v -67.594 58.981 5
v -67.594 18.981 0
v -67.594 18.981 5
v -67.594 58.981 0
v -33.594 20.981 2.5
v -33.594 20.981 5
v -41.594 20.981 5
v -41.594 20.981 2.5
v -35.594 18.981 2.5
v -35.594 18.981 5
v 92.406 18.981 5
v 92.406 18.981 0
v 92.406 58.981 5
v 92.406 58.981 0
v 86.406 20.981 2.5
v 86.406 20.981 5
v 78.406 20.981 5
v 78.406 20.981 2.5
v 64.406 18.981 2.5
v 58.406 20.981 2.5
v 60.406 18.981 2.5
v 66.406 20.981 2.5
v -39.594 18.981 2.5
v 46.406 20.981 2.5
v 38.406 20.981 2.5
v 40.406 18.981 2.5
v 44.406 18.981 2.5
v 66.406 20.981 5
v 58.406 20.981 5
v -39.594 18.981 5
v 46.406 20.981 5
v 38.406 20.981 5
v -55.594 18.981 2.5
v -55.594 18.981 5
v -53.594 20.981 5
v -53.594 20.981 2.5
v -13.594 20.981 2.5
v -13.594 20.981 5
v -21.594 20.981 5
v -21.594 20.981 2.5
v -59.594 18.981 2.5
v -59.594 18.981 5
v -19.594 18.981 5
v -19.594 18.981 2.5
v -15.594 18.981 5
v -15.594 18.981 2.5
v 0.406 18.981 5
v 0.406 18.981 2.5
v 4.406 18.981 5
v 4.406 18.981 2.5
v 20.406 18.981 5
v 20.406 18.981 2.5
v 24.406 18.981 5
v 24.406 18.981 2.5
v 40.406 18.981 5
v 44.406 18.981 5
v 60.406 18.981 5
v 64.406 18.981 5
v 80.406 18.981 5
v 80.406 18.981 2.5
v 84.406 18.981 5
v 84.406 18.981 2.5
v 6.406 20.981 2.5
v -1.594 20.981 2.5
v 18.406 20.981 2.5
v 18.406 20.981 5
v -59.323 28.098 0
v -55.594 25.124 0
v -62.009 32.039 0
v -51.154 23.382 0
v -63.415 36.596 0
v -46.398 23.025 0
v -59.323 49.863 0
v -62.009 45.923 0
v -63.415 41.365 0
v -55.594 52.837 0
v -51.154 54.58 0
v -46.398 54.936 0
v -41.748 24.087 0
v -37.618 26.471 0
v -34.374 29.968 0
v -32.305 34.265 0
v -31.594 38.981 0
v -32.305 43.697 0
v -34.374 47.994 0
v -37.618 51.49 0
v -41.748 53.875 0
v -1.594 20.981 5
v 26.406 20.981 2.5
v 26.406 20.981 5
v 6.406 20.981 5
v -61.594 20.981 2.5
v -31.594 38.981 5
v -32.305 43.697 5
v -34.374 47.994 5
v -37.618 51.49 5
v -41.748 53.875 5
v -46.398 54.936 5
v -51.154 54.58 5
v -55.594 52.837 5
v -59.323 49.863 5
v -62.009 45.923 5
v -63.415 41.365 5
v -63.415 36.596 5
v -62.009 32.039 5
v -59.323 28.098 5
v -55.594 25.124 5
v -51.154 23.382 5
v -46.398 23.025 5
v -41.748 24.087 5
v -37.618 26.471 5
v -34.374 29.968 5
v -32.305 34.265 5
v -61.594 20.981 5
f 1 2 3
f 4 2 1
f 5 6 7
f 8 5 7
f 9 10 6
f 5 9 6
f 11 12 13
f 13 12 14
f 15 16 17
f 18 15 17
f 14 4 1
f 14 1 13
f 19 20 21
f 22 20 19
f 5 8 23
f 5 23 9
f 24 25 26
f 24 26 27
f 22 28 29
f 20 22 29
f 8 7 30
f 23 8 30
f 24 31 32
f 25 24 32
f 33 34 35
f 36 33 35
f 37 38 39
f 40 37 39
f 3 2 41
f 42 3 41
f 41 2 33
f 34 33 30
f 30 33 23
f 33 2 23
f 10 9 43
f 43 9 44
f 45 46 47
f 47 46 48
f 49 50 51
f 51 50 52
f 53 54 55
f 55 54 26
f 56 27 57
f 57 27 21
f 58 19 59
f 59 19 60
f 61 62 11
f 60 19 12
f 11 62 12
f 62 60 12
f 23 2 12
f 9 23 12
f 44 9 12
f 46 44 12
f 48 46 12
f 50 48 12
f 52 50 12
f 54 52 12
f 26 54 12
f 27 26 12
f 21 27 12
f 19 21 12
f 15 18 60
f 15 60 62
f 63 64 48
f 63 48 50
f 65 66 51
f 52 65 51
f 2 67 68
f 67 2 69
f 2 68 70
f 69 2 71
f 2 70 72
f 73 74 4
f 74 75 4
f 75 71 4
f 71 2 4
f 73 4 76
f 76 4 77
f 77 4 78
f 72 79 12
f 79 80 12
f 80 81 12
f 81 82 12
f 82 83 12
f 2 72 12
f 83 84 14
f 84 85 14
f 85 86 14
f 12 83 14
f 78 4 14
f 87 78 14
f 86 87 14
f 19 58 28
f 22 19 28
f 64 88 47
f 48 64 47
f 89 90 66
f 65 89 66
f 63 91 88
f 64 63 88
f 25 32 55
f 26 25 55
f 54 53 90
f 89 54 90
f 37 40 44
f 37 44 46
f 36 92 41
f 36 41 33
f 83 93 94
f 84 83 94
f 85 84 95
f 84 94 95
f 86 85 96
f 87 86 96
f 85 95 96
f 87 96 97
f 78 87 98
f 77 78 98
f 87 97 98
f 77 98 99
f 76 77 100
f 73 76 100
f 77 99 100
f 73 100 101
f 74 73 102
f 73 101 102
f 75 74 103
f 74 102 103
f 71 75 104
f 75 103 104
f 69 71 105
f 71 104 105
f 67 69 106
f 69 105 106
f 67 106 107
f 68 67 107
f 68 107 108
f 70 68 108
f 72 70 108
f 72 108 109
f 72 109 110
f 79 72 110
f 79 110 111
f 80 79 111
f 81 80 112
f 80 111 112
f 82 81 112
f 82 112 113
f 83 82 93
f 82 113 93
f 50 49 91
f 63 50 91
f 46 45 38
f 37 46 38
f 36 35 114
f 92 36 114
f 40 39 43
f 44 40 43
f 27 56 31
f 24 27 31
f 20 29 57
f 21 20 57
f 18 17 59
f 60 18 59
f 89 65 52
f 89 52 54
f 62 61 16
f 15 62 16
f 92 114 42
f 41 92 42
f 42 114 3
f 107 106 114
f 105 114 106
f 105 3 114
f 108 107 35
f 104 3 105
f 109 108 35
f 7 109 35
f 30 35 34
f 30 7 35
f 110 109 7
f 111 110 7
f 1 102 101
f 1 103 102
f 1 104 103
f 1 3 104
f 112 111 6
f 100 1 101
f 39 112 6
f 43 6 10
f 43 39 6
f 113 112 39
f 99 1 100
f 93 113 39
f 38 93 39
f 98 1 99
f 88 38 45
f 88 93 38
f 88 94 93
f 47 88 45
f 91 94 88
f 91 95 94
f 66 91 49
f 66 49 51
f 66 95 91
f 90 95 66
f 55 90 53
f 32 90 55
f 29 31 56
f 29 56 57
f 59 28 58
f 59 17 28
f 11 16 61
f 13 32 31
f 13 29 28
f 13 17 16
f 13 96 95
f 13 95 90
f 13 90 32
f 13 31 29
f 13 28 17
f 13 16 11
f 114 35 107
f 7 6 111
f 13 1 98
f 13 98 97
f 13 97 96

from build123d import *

# Parameters (mm, degrees)
F0_W     = 160
F0_H     = 40
F1_DEPTH = 5
F2_R     = 16
F3_DEPTH = 5
F5_DEPTH = 2.5


with BuildPart() as f1:
    # F0 (on Top) → F1 (new body)
    with BuildSketch(Plane.XY):
        with Locations((12.406252, 38.980732)):
            Rectangle(F0_W, F0_H)
    extrude(amount=F1_DEPTH)

    # F2 (on face) → F3 (cut)
    with BuildSketch(Plane.XY.offset(5)):
        with Locations((-47.593748, 38.980732)):
            Circle(F2_R)
    extrude(amount=-F3_DEPTH, mode=Mode.SUBTRACT)

    # F4 (on face) → F5 (cut)
    with BuildSketch(Plane.XY.offset(5)):
        Polygon((-53.593748, 20.980732), (-61.593748, 20.980732), (-59.593748, 18.980732), (-55.593748, 18.980732), align=None)
        Polygon((-33.593748, 20.980732), (-41.593748, 20.980732), (-39.593748, 18.980732), (-35.593748, 18.980732), align=None)
        Polygon((-13.593748, 20.980732), (-21.593748, 20.980732), (-19.593748, 18.980732), (-15.593748, 18.980732), align=None)
        Polygon((6.406252, 20.980732), (-1.593748, 20.980732), (0.406252, 18.980732), (4.406252, 18.980732), align=None)
        Polygon((26.406252, 20.980732), (18.406252, 20.980732), (20.406252, 18.980732), (24.406252, 18.980732), align=None)
        Polygon((44.406252, 18.980732), (46.406252, 20.980732), (38.406252, 20.980732), (40.406252, 18.980732), align=None)
        Polygon((64.406252, 18.980732), (66.406252, 20.980732), (58.406252, 20.980732), (60.406252, 18.980732), align=None)
        Polygon((84.406252, 18.980732), (86.406252, 20.980732), (78.406252, 20.980732), (80.406252, 18.980732), align=None)
    extrude(amount=-F5_DEPTH, mode=Mode.SUBTRACT)


solid = f1.part
